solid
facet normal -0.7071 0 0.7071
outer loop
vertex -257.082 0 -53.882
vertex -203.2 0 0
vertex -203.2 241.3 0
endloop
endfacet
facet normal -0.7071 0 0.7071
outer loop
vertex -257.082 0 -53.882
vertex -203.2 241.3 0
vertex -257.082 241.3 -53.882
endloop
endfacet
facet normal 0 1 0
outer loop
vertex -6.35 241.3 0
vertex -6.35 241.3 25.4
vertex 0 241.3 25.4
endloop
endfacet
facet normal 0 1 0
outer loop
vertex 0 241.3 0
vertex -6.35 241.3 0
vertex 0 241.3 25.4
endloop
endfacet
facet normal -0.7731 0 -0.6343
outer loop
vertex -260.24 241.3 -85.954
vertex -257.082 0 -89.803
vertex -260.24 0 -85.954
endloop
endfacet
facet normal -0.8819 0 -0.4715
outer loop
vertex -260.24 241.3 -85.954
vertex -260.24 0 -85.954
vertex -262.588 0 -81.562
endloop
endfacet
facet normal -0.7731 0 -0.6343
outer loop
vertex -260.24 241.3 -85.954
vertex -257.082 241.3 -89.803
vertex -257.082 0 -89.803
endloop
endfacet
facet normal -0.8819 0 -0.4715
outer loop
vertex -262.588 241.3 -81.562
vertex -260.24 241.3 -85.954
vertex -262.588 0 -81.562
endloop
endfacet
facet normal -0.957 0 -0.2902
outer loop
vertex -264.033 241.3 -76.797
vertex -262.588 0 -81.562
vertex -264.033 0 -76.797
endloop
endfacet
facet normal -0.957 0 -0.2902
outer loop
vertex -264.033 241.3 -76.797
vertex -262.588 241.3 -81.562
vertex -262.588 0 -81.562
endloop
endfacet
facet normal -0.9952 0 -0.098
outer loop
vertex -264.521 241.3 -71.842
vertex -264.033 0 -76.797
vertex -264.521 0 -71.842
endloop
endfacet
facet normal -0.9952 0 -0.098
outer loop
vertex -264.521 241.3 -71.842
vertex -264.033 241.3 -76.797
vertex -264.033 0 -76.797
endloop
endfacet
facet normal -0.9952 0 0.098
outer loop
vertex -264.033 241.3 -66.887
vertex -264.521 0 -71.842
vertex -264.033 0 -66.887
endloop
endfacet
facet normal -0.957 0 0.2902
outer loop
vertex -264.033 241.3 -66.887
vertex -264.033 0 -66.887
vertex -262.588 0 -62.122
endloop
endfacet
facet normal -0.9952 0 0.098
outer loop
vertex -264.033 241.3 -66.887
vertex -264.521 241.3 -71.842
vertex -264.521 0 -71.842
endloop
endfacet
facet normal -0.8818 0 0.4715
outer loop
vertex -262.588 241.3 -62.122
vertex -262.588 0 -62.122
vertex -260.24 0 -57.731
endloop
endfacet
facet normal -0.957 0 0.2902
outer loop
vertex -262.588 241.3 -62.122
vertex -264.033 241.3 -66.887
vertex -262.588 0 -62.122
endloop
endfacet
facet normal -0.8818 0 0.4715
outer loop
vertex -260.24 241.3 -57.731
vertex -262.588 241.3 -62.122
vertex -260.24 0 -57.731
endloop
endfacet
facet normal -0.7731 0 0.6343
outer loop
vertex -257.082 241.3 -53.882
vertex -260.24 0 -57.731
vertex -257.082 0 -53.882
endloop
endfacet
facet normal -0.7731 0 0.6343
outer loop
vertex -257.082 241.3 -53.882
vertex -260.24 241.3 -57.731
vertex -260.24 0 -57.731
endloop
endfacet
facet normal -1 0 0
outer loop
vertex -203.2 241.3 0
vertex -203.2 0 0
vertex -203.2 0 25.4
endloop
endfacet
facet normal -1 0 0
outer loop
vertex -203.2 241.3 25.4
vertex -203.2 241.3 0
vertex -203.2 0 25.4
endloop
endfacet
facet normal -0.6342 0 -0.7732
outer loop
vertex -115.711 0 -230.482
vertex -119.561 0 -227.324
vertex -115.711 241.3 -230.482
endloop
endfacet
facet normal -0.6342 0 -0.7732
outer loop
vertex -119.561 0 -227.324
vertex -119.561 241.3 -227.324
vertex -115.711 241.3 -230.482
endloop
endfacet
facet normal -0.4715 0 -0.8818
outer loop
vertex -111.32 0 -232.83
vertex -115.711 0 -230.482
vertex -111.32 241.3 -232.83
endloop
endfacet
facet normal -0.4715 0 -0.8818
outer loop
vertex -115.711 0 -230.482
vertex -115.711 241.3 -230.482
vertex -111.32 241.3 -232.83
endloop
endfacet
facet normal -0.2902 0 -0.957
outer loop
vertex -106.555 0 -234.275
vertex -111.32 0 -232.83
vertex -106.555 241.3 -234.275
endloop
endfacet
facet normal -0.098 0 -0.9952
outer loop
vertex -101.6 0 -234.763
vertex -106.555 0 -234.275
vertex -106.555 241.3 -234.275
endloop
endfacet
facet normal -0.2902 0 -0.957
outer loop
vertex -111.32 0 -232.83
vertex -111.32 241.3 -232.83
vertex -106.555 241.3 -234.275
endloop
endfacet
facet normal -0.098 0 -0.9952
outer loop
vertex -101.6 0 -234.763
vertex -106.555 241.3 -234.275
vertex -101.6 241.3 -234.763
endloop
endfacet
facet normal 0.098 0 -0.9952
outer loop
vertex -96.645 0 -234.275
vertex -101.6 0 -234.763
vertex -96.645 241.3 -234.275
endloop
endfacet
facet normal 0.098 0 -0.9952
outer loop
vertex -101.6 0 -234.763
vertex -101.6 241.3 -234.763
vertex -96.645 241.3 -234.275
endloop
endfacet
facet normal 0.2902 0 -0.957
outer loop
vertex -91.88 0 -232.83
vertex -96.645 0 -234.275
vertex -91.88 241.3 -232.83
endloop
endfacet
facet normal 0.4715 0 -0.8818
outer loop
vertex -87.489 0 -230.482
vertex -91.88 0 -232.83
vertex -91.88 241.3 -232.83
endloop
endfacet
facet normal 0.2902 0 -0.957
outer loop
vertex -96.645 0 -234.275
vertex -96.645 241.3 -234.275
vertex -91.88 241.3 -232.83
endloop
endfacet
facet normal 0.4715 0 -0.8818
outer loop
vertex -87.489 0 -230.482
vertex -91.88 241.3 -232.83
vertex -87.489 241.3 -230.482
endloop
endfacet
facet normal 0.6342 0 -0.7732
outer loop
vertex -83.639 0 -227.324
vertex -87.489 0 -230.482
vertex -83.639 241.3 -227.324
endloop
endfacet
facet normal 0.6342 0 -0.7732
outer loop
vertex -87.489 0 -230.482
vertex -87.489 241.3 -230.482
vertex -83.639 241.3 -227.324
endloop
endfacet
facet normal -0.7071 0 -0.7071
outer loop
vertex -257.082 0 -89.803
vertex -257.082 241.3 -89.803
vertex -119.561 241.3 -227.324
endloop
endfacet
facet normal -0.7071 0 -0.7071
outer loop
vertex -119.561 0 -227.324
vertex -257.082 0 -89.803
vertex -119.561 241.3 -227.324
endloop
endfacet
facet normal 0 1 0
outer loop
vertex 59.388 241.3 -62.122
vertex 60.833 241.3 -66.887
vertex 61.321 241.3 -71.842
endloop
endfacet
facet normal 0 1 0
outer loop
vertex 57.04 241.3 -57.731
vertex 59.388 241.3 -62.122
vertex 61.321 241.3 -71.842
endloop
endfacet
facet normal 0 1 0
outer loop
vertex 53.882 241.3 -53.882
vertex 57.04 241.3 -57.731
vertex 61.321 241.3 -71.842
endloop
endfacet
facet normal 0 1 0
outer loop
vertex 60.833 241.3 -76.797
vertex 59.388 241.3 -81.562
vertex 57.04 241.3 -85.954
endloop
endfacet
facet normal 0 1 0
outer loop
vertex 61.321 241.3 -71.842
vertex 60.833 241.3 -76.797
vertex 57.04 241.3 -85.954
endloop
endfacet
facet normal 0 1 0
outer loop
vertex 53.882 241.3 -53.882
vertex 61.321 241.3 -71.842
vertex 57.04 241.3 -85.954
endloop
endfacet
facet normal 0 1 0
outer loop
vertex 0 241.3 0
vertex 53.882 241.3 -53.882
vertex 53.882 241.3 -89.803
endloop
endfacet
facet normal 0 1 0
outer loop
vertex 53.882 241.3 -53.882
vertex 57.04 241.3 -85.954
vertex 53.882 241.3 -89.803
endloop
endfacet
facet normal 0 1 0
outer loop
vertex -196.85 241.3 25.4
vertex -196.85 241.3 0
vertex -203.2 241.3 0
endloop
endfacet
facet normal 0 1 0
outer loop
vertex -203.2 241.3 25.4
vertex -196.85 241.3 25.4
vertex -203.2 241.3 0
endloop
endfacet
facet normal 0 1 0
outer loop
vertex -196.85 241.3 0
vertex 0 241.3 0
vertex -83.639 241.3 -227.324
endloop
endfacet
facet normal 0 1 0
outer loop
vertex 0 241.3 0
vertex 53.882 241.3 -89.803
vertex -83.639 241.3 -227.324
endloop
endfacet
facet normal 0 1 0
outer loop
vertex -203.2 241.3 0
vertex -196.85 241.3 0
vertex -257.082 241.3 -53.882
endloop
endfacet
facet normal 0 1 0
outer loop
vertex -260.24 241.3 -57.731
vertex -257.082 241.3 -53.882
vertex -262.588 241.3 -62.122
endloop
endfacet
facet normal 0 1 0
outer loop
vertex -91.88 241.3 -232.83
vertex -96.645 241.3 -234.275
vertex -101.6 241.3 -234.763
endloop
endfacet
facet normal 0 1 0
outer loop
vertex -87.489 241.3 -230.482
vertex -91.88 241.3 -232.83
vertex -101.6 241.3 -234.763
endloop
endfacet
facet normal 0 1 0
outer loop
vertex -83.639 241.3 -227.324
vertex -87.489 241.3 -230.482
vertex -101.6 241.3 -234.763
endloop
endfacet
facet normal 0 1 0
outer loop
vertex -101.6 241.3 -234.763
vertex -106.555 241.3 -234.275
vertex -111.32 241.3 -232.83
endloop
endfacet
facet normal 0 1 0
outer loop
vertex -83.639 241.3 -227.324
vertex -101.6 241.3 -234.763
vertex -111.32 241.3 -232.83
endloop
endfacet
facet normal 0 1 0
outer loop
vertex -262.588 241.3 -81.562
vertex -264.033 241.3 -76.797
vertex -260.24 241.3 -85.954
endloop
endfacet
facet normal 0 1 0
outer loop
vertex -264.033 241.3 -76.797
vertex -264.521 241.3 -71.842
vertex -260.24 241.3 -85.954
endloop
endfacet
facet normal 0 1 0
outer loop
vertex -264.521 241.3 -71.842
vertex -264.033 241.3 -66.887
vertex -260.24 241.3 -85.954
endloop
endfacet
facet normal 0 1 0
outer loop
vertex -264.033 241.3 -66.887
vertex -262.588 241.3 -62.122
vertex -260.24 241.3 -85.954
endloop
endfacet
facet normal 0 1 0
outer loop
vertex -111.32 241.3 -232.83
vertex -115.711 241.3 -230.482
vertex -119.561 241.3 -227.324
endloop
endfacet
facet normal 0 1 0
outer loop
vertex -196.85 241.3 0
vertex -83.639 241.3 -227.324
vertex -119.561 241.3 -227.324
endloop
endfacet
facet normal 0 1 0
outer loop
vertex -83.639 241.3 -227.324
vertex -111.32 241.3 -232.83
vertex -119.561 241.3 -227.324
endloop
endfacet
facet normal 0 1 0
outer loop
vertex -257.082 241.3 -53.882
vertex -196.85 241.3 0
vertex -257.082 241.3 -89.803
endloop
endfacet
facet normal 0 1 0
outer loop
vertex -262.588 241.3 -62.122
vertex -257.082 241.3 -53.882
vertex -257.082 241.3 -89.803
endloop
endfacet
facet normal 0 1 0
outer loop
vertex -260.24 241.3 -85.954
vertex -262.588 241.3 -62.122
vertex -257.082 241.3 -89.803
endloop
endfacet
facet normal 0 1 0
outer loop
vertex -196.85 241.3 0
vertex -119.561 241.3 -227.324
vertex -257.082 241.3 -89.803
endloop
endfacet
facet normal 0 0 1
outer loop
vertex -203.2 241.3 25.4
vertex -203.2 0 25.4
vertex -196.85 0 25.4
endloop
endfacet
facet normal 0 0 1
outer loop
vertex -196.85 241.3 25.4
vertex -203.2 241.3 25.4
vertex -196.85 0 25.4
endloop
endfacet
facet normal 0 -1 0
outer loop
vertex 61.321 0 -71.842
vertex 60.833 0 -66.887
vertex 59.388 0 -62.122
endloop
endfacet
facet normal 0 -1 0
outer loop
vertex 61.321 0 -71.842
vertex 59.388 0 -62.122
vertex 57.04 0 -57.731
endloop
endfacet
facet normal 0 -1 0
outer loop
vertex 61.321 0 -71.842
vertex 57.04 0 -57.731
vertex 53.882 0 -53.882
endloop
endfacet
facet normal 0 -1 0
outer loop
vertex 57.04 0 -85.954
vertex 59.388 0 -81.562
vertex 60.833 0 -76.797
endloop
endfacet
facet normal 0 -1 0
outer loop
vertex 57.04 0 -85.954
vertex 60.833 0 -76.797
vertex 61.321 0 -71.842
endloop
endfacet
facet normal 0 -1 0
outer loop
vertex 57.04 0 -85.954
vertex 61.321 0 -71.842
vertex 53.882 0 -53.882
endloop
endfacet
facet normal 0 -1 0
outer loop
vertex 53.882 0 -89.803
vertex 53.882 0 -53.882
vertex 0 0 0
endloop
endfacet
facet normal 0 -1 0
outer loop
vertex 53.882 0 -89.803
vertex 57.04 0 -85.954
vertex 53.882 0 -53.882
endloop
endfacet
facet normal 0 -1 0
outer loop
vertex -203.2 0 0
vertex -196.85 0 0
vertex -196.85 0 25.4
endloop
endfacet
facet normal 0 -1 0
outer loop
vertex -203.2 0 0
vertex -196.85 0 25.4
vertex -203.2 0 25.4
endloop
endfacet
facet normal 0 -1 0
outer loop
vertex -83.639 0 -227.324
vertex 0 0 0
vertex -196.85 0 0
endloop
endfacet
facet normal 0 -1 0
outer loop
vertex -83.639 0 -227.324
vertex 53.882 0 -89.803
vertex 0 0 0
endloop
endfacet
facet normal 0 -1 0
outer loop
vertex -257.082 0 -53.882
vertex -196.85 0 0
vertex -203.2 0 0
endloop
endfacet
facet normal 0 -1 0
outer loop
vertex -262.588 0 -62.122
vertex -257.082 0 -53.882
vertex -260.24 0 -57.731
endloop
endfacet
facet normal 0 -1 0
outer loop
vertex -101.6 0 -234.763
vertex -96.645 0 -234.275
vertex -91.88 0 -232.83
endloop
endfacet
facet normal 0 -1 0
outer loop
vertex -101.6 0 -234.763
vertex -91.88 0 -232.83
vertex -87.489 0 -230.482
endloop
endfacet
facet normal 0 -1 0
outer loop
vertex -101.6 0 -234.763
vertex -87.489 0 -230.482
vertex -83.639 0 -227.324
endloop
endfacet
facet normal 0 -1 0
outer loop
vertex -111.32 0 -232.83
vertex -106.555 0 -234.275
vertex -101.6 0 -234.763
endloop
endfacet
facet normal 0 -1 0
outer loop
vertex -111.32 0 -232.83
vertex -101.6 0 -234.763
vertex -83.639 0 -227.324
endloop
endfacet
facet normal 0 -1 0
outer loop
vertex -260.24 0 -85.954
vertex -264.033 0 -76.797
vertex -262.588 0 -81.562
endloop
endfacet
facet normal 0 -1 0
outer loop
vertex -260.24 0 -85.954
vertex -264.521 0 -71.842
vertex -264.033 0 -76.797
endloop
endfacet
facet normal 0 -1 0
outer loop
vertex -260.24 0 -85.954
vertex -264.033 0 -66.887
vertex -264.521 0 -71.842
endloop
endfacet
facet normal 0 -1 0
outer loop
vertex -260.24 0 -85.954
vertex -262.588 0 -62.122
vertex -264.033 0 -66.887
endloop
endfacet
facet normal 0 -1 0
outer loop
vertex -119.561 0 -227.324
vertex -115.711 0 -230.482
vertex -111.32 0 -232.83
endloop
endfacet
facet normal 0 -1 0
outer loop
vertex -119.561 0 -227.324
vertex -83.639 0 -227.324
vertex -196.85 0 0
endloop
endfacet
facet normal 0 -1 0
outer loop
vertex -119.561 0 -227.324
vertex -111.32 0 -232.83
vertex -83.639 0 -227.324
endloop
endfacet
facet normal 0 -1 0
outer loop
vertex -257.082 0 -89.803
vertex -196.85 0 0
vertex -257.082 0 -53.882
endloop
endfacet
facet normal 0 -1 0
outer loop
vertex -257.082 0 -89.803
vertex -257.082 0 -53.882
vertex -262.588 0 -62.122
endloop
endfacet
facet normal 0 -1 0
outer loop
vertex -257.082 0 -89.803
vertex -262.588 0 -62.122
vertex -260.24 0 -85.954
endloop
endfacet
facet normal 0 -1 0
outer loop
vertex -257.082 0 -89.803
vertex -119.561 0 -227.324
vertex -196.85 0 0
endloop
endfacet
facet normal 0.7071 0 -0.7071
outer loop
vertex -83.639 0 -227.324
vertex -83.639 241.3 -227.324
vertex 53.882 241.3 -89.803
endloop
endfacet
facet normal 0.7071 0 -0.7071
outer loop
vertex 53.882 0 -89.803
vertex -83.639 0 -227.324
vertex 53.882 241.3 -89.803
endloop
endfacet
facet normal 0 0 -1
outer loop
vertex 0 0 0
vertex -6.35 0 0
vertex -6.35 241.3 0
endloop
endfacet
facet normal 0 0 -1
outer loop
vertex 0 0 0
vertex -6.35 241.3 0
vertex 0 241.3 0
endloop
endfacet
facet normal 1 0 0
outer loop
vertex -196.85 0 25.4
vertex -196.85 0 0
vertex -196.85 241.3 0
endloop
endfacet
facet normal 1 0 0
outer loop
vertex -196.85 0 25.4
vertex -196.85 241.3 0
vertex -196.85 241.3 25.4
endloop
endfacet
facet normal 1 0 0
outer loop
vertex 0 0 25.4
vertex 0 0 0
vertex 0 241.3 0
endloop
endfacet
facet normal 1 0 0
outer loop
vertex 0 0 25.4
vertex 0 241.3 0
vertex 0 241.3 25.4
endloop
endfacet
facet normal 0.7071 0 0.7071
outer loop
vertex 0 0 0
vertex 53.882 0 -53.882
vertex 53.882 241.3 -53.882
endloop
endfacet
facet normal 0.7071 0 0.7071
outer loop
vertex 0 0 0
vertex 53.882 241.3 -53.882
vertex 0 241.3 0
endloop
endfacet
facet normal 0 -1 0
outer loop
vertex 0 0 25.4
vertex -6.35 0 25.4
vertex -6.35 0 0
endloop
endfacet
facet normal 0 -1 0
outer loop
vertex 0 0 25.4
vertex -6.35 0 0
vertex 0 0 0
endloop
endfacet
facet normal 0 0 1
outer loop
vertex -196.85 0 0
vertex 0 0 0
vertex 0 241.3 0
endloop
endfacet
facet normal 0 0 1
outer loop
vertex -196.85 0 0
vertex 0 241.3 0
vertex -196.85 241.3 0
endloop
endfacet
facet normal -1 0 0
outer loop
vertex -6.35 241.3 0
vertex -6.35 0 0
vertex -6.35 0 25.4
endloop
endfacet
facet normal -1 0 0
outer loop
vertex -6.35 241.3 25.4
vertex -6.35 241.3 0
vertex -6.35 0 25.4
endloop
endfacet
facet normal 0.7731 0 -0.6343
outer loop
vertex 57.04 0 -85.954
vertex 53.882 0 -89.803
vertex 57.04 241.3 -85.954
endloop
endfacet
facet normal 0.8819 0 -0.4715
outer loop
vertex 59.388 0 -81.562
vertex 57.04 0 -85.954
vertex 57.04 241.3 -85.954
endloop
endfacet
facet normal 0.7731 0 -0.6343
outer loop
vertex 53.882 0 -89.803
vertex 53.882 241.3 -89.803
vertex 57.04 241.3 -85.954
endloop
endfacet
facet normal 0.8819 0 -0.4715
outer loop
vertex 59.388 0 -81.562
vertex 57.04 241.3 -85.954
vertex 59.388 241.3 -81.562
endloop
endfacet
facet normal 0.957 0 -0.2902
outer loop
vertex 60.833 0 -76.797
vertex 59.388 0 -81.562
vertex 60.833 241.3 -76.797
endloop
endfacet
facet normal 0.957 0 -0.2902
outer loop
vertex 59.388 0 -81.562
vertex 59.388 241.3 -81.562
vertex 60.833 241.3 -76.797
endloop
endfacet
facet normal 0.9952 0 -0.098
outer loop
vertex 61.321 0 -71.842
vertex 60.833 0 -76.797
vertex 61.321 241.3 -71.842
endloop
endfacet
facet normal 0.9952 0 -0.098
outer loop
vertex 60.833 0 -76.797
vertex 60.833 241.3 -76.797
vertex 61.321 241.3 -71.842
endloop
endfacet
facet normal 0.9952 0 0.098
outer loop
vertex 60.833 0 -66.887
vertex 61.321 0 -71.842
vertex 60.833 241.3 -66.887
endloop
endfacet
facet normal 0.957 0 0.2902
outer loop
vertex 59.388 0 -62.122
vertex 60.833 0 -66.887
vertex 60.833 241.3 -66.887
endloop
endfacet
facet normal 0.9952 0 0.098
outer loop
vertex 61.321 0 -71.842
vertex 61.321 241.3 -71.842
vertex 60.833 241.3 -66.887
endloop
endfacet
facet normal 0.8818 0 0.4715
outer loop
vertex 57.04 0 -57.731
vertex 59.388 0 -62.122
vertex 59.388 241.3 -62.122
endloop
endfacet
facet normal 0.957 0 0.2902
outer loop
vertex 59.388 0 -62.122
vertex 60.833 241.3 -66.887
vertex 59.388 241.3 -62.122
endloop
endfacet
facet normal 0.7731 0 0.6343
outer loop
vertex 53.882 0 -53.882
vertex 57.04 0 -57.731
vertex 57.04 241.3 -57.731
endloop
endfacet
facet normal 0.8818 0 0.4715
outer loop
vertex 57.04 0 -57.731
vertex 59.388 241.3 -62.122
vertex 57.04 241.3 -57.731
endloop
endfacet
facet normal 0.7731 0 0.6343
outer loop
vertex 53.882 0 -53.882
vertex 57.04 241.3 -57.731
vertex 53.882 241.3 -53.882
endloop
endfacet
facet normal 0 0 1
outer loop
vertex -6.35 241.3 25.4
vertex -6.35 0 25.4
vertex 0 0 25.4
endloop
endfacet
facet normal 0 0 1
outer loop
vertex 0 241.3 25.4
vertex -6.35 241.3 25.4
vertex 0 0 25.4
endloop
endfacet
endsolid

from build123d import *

# Parameters (mm, degrees)
SKETCH6_W             = 6.35
SKETCH6_H             = 25.4
BOSS_EXTRUDE1_DEPTH   = 241.3
BOSS_EXTRUDE1_2_DEPTH = 241.3
BOSS_EXTRUDE2_DEPTH   = 241.3
FILLET2_R             = 25.4
FILLET3_R             = 25.4
FILLET4_R             = 25.4


with BuildPart() as part:
    # Sketch6 → Boss-Extrude1 (new body)
    with BuildSketch(Plane.XZ):
        with Locations((-200.025, 12.7)):
            Rectangle(SKETCH6_W, SKETCH6_H)
    extrude(amount=-BOSS_EXTRUDE1_DEPTH)

    # Sketch10 → Boss-Extrude2 (add)
    with BuildSketch(Plane(origin=(0, 0, 0), x_dir=(1, 0, 0), z_dir=(0, 1, 0))):
        Polygon((0, 0), (-203.2, 0), (-275.042048969, 71.842048969), (-101.6, 245.284097937), (71.842048969, 71.842048969), align=None)
    extrude(amount=BOSS_EXTRUDE2_DEPTH)

    # Fillet2
    fillet2_edges = [part.edges().sort_by_distance(p)[0] for p in [
        (-101.6, 120.65, -245.284097937),
    ]]
    fillet(fillet2_edges, radius=FILLET2_R)

    # Fillet3
    fillet3_edges = [part.edges().sort_by_distance(p)[0] for p in [
        (-275.042048969, 120.65, -71.842048969),
    ]]
    fillet(fillet3_edges, radius=FILLET3_R)

    # Fillet4
    fillet4_edges = [part.edges().sort_by_distance(p)[0] for p in [
        (71.842048969, 120.65, -71.842048969),
    ]]
    fillet(fillet4_edges, radius=FILLET4_R)


with BuildPart() as body_2:
    # Sketch6 → Boss-Extrude1 2 (new body)
    with BuildSketch(Plane.XZ):
        with Locations((-3.175, 12.7)):
            Rectangle(SKETCH6_W, SKETCH6_H)
    extrude(amount=-BOSS_EXTRUDE1_2_DEPTH)


solid = Compound([part.part, body_2.part])
